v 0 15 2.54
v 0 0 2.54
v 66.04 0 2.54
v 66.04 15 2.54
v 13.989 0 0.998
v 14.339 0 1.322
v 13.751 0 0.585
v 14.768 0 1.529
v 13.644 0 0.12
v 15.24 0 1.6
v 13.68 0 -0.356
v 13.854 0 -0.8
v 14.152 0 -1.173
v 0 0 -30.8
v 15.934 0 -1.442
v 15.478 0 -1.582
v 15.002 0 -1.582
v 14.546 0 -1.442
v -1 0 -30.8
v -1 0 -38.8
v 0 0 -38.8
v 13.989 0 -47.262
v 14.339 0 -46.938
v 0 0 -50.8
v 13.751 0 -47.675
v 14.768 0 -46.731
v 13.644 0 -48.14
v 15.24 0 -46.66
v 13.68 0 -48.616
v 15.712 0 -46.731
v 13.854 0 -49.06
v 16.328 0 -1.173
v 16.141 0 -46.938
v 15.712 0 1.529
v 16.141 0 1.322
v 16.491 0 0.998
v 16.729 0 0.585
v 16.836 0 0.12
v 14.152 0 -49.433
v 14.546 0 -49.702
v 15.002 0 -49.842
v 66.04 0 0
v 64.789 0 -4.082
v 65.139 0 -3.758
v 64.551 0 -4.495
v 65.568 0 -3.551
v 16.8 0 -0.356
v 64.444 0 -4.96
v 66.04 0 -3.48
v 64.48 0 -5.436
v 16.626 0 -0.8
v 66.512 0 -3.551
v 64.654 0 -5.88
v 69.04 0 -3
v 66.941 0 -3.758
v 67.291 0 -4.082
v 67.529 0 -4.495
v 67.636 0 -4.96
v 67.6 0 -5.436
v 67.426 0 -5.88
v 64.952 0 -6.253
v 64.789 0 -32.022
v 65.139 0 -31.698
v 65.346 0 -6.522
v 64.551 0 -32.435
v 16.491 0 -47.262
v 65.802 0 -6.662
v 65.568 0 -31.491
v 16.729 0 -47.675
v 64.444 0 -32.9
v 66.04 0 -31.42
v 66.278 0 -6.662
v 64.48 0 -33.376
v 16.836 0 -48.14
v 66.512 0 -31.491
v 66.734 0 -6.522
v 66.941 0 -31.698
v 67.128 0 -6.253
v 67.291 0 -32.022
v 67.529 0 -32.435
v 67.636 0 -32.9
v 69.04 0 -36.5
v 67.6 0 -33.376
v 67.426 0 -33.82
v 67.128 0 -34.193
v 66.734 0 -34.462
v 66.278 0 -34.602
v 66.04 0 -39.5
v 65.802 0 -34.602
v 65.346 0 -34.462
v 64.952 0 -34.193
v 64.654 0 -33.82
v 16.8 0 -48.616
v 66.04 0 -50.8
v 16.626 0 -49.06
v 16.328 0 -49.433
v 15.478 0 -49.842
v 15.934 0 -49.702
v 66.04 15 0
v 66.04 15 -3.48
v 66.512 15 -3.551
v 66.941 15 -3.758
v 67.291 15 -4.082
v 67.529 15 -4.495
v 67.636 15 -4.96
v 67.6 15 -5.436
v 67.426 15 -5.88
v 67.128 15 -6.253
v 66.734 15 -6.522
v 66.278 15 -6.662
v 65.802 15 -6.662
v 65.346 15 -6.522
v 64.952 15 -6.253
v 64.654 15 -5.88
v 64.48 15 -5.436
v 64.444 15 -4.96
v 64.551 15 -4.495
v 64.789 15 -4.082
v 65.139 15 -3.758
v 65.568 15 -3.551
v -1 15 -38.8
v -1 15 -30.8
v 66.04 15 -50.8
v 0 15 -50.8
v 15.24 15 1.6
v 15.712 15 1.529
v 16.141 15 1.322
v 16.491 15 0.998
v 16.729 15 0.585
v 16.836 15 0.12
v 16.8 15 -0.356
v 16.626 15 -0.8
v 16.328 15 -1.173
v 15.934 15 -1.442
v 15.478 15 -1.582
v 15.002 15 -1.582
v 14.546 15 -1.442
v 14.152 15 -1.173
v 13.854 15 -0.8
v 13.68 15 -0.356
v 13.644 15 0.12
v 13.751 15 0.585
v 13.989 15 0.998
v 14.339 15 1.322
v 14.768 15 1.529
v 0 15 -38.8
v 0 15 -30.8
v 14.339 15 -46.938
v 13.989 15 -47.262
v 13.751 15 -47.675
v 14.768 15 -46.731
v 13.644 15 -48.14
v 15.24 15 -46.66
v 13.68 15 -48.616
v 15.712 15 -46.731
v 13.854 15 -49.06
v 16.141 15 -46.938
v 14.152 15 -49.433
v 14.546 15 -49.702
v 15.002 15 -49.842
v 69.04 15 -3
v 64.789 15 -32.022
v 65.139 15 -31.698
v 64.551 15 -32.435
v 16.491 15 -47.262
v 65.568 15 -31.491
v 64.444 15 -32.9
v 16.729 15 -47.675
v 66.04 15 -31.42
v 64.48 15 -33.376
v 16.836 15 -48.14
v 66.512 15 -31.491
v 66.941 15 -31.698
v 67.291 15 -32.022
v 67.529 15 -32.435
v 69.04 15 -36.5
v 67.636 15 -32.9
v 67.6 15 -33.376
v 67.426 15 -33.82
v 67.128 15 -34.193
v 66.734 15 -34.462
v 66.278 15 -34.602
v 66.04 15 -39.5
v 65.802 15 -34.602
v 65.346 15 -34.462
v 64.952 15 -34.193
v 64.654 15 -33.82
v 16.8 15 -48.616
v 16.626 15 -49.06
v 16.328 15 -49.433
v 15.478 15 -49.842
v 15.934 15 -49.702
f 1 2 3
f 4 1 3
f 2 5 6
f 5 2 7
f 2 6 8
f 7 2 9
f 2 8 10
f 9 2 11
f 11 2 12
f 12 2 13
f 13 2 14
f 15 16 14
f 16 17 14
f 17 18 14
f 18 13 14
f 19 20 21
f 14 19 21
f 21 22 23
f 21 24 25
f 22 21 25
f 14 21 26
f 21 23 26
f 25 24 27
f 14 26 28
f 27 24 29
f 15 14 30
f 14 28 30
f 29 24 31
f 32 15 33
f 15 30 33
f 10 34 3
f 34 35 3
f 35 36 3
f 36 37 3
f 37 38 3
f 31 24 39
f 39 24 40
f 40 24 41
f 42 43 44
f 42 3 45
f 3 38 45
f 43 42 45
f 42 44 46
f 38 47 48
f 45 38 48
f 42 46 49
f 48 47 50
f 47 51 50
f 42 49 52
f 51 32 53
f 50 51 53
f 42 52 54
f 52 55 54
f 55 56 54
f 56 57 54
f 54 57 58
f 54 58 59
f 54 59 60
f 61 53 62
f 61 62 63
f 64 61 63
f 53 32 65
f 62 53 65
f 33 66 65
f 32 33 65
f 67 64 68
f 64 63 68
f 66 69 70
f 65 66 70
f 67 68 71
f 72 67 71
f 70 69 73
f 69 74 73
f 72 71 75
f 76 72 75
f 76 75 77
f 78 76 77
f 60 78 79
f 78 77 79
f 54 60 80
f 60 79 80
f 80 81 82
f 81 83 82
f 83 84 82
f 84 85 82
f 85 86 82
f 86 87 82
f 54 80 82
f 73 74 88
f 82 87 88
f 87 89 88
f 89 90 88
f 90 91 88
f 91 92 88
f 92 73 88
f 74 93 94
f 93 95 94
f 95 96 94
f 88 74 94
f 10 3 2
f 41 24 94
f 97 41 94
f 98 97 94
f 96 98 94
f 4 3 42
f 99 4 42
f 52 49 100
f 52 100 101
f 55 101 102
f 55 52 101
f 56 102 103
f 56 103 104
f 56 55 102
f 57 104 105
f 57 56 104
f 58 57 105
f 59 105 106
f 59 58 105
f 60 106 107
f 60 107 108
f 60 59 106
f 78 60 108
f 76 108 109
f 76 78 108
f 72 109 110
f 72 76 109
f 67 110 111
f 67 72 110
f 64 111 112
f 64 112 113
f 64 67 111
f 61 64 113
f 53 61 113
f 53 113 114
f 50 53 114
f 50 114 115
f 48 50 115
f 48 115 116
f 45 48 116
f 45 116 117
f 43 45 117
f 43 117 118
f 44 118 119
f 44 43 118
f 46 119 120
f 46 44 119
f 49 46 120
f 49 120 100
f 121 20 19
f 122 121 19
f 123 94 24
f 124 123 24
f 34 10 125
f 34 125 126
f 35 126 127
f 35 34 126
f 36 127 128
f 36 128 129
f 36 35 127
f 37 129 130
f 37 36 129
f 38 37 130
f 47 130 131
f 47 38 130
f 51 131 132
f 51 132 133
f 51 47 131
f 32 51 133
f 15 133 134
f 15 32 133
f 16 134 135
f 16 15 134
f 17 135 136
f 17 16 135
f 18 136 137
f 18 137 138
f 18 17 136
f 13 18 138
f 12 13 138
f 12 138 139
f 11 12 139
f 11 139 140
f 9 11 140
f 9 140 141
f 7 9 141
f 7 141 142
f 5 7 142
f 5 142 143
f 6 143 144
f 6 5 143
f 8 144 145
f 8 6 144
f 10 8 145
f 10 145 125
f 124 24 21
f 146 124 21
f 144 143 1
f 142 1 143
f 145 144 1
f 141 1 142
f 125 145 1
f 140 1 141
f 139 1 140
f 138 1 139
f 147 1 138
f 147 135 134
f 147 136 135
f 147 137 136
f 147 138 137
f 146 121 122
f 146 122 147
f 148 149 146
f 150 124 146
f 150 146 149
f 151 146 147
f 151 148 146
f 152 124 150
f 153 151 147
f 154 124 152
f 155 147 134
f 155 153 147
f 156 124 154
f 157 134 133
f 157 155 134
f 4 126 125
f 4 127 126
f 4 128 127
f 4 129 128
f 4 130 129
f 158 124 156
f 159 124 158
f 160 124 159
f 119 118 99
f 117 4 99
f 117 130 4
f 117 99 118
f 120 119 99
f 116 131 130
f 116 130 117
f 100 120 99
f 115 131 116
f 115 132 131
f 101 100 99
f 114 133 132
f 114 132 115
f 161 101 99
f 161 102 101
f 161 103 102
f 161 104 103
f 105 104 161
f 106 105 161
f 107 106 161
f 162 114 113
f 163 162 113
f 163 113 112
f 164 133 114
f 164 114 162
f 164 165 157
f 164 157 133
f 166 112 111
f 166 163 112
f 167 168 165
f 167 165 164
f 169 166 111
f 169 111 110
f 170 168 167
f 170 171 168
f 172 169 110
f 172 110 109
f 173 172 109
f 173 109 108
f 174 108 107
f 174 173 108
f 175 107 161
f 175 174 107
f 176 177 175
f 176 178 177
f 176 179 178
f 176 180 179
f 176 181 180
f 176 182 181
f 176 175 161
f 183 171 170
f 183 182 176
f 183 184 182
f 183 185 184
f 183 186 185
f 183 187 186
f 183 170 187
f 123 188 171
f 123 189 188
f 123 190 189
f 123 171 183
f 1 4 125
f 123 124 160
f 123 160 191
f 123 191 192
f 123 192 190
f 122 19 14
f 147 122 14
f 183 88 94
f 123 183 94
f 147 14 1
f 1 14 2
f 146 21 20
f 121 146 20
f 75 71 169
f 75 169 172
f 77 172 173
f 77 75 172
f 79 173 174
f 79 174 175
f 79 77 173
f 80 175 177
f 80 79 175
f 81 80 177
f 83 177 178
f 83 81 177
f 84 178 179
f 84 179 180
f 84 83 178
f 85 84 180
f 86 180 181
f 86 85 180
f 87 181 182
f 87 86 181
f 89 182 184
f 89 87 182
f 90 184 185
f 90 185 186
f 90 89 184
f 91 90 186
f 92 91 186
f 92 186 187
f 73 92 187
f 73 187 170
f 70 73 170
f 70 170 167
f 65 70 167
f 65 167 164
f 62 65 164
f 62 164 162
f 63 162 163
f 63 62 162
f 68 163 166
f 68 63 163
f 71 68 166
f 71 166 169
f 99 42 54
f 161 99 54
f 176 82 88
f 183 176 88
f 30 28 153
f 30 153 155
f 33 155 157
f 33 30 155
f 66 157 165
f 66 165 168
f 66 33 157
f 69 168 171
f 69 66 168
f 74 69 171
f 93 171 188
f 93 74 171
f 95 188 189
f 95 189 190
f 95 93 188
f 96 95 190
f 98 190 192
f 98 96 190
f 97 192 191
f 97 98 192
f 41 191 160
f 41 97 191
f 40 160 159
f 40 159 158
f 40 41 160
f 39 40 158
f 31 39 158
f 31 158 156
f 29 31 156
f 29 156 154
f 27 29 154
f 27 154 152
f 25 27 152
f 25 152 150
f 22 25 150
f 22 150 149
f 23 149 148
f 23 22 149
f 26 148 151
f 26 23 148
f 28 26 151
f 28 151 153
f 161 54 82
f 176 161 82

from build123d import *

# Parameters (mm, degrees)
SZKIC1_R                    = 1.6
DODANIE_WYCI_GNI_CIE1_DEPTH = 15
SZKIC2_W                    = 2
SZKIC2_H                    = 9
WYTNIJ_WYCI_GNI_CIE1_DEPTH  = 88.018168218


with BuildPart() as part:
    # Szkic1 → Dodanie-wyciągnięcie1 (new body)
    with BuildSketch(Plane(origin=(0, 0, 0), x_dir=(1, 0, 0), z_dir=(0, 1, 0))):
        Polygon((0, -2.54), (66.04, -2.54), (66.04, 0), (69.04, 3), (69.04, 36.5), (66.04, 39.5), (66.04, 50.8), (0, 50.8), (0, 38.8), (-1, 38.8), (-1, 30.8), (0, 30.8), (0, 9), (-2, 9), (-2, 0), (0, 0), align=None)
        with Locations(Location((15.24, 0, 0), (0, 0, 270))):
            Circle(SZKIC1_R, mode=Mode.SUBTRACT)
        with Locations(Location((66.04, 33.02, 0), (0, 0, 270))):
            Circle(SZKIC1_R, mode=Mode.SUBTRACT)
        with Locations(Location((66.04, 5.08, 0), (0, 0, 270))):
            Circle(SZKIC1_R, mode=Mode.SUBTRACT)
        with Locations(Location((15.24, 48.26, 0), (0, 0, 270))):
            Circle(SZKIC1_R, mode=Mode.SUBTRACT)
    extrude(amount=DODANIE_WYCI_GNI_CIE1_DEPTH)

    # Szkic2 → Wytnij-wyciągnięcie1 (cut, through all)
    with BuildSketch(Plane(origin=(0, 15, 0), x_dir=(1, 0, 0), z_dir=(0, 1, 0))):
        with Locations((-1, 4.5)):
            Rectangle(SZKIC2_W, SZKIC2_H)
    extrude(amount=-WYTNIJ_WYCI_GNI_CIE1_DEPTH, mode=Mode.SUBTRACT)


solid = part.part
